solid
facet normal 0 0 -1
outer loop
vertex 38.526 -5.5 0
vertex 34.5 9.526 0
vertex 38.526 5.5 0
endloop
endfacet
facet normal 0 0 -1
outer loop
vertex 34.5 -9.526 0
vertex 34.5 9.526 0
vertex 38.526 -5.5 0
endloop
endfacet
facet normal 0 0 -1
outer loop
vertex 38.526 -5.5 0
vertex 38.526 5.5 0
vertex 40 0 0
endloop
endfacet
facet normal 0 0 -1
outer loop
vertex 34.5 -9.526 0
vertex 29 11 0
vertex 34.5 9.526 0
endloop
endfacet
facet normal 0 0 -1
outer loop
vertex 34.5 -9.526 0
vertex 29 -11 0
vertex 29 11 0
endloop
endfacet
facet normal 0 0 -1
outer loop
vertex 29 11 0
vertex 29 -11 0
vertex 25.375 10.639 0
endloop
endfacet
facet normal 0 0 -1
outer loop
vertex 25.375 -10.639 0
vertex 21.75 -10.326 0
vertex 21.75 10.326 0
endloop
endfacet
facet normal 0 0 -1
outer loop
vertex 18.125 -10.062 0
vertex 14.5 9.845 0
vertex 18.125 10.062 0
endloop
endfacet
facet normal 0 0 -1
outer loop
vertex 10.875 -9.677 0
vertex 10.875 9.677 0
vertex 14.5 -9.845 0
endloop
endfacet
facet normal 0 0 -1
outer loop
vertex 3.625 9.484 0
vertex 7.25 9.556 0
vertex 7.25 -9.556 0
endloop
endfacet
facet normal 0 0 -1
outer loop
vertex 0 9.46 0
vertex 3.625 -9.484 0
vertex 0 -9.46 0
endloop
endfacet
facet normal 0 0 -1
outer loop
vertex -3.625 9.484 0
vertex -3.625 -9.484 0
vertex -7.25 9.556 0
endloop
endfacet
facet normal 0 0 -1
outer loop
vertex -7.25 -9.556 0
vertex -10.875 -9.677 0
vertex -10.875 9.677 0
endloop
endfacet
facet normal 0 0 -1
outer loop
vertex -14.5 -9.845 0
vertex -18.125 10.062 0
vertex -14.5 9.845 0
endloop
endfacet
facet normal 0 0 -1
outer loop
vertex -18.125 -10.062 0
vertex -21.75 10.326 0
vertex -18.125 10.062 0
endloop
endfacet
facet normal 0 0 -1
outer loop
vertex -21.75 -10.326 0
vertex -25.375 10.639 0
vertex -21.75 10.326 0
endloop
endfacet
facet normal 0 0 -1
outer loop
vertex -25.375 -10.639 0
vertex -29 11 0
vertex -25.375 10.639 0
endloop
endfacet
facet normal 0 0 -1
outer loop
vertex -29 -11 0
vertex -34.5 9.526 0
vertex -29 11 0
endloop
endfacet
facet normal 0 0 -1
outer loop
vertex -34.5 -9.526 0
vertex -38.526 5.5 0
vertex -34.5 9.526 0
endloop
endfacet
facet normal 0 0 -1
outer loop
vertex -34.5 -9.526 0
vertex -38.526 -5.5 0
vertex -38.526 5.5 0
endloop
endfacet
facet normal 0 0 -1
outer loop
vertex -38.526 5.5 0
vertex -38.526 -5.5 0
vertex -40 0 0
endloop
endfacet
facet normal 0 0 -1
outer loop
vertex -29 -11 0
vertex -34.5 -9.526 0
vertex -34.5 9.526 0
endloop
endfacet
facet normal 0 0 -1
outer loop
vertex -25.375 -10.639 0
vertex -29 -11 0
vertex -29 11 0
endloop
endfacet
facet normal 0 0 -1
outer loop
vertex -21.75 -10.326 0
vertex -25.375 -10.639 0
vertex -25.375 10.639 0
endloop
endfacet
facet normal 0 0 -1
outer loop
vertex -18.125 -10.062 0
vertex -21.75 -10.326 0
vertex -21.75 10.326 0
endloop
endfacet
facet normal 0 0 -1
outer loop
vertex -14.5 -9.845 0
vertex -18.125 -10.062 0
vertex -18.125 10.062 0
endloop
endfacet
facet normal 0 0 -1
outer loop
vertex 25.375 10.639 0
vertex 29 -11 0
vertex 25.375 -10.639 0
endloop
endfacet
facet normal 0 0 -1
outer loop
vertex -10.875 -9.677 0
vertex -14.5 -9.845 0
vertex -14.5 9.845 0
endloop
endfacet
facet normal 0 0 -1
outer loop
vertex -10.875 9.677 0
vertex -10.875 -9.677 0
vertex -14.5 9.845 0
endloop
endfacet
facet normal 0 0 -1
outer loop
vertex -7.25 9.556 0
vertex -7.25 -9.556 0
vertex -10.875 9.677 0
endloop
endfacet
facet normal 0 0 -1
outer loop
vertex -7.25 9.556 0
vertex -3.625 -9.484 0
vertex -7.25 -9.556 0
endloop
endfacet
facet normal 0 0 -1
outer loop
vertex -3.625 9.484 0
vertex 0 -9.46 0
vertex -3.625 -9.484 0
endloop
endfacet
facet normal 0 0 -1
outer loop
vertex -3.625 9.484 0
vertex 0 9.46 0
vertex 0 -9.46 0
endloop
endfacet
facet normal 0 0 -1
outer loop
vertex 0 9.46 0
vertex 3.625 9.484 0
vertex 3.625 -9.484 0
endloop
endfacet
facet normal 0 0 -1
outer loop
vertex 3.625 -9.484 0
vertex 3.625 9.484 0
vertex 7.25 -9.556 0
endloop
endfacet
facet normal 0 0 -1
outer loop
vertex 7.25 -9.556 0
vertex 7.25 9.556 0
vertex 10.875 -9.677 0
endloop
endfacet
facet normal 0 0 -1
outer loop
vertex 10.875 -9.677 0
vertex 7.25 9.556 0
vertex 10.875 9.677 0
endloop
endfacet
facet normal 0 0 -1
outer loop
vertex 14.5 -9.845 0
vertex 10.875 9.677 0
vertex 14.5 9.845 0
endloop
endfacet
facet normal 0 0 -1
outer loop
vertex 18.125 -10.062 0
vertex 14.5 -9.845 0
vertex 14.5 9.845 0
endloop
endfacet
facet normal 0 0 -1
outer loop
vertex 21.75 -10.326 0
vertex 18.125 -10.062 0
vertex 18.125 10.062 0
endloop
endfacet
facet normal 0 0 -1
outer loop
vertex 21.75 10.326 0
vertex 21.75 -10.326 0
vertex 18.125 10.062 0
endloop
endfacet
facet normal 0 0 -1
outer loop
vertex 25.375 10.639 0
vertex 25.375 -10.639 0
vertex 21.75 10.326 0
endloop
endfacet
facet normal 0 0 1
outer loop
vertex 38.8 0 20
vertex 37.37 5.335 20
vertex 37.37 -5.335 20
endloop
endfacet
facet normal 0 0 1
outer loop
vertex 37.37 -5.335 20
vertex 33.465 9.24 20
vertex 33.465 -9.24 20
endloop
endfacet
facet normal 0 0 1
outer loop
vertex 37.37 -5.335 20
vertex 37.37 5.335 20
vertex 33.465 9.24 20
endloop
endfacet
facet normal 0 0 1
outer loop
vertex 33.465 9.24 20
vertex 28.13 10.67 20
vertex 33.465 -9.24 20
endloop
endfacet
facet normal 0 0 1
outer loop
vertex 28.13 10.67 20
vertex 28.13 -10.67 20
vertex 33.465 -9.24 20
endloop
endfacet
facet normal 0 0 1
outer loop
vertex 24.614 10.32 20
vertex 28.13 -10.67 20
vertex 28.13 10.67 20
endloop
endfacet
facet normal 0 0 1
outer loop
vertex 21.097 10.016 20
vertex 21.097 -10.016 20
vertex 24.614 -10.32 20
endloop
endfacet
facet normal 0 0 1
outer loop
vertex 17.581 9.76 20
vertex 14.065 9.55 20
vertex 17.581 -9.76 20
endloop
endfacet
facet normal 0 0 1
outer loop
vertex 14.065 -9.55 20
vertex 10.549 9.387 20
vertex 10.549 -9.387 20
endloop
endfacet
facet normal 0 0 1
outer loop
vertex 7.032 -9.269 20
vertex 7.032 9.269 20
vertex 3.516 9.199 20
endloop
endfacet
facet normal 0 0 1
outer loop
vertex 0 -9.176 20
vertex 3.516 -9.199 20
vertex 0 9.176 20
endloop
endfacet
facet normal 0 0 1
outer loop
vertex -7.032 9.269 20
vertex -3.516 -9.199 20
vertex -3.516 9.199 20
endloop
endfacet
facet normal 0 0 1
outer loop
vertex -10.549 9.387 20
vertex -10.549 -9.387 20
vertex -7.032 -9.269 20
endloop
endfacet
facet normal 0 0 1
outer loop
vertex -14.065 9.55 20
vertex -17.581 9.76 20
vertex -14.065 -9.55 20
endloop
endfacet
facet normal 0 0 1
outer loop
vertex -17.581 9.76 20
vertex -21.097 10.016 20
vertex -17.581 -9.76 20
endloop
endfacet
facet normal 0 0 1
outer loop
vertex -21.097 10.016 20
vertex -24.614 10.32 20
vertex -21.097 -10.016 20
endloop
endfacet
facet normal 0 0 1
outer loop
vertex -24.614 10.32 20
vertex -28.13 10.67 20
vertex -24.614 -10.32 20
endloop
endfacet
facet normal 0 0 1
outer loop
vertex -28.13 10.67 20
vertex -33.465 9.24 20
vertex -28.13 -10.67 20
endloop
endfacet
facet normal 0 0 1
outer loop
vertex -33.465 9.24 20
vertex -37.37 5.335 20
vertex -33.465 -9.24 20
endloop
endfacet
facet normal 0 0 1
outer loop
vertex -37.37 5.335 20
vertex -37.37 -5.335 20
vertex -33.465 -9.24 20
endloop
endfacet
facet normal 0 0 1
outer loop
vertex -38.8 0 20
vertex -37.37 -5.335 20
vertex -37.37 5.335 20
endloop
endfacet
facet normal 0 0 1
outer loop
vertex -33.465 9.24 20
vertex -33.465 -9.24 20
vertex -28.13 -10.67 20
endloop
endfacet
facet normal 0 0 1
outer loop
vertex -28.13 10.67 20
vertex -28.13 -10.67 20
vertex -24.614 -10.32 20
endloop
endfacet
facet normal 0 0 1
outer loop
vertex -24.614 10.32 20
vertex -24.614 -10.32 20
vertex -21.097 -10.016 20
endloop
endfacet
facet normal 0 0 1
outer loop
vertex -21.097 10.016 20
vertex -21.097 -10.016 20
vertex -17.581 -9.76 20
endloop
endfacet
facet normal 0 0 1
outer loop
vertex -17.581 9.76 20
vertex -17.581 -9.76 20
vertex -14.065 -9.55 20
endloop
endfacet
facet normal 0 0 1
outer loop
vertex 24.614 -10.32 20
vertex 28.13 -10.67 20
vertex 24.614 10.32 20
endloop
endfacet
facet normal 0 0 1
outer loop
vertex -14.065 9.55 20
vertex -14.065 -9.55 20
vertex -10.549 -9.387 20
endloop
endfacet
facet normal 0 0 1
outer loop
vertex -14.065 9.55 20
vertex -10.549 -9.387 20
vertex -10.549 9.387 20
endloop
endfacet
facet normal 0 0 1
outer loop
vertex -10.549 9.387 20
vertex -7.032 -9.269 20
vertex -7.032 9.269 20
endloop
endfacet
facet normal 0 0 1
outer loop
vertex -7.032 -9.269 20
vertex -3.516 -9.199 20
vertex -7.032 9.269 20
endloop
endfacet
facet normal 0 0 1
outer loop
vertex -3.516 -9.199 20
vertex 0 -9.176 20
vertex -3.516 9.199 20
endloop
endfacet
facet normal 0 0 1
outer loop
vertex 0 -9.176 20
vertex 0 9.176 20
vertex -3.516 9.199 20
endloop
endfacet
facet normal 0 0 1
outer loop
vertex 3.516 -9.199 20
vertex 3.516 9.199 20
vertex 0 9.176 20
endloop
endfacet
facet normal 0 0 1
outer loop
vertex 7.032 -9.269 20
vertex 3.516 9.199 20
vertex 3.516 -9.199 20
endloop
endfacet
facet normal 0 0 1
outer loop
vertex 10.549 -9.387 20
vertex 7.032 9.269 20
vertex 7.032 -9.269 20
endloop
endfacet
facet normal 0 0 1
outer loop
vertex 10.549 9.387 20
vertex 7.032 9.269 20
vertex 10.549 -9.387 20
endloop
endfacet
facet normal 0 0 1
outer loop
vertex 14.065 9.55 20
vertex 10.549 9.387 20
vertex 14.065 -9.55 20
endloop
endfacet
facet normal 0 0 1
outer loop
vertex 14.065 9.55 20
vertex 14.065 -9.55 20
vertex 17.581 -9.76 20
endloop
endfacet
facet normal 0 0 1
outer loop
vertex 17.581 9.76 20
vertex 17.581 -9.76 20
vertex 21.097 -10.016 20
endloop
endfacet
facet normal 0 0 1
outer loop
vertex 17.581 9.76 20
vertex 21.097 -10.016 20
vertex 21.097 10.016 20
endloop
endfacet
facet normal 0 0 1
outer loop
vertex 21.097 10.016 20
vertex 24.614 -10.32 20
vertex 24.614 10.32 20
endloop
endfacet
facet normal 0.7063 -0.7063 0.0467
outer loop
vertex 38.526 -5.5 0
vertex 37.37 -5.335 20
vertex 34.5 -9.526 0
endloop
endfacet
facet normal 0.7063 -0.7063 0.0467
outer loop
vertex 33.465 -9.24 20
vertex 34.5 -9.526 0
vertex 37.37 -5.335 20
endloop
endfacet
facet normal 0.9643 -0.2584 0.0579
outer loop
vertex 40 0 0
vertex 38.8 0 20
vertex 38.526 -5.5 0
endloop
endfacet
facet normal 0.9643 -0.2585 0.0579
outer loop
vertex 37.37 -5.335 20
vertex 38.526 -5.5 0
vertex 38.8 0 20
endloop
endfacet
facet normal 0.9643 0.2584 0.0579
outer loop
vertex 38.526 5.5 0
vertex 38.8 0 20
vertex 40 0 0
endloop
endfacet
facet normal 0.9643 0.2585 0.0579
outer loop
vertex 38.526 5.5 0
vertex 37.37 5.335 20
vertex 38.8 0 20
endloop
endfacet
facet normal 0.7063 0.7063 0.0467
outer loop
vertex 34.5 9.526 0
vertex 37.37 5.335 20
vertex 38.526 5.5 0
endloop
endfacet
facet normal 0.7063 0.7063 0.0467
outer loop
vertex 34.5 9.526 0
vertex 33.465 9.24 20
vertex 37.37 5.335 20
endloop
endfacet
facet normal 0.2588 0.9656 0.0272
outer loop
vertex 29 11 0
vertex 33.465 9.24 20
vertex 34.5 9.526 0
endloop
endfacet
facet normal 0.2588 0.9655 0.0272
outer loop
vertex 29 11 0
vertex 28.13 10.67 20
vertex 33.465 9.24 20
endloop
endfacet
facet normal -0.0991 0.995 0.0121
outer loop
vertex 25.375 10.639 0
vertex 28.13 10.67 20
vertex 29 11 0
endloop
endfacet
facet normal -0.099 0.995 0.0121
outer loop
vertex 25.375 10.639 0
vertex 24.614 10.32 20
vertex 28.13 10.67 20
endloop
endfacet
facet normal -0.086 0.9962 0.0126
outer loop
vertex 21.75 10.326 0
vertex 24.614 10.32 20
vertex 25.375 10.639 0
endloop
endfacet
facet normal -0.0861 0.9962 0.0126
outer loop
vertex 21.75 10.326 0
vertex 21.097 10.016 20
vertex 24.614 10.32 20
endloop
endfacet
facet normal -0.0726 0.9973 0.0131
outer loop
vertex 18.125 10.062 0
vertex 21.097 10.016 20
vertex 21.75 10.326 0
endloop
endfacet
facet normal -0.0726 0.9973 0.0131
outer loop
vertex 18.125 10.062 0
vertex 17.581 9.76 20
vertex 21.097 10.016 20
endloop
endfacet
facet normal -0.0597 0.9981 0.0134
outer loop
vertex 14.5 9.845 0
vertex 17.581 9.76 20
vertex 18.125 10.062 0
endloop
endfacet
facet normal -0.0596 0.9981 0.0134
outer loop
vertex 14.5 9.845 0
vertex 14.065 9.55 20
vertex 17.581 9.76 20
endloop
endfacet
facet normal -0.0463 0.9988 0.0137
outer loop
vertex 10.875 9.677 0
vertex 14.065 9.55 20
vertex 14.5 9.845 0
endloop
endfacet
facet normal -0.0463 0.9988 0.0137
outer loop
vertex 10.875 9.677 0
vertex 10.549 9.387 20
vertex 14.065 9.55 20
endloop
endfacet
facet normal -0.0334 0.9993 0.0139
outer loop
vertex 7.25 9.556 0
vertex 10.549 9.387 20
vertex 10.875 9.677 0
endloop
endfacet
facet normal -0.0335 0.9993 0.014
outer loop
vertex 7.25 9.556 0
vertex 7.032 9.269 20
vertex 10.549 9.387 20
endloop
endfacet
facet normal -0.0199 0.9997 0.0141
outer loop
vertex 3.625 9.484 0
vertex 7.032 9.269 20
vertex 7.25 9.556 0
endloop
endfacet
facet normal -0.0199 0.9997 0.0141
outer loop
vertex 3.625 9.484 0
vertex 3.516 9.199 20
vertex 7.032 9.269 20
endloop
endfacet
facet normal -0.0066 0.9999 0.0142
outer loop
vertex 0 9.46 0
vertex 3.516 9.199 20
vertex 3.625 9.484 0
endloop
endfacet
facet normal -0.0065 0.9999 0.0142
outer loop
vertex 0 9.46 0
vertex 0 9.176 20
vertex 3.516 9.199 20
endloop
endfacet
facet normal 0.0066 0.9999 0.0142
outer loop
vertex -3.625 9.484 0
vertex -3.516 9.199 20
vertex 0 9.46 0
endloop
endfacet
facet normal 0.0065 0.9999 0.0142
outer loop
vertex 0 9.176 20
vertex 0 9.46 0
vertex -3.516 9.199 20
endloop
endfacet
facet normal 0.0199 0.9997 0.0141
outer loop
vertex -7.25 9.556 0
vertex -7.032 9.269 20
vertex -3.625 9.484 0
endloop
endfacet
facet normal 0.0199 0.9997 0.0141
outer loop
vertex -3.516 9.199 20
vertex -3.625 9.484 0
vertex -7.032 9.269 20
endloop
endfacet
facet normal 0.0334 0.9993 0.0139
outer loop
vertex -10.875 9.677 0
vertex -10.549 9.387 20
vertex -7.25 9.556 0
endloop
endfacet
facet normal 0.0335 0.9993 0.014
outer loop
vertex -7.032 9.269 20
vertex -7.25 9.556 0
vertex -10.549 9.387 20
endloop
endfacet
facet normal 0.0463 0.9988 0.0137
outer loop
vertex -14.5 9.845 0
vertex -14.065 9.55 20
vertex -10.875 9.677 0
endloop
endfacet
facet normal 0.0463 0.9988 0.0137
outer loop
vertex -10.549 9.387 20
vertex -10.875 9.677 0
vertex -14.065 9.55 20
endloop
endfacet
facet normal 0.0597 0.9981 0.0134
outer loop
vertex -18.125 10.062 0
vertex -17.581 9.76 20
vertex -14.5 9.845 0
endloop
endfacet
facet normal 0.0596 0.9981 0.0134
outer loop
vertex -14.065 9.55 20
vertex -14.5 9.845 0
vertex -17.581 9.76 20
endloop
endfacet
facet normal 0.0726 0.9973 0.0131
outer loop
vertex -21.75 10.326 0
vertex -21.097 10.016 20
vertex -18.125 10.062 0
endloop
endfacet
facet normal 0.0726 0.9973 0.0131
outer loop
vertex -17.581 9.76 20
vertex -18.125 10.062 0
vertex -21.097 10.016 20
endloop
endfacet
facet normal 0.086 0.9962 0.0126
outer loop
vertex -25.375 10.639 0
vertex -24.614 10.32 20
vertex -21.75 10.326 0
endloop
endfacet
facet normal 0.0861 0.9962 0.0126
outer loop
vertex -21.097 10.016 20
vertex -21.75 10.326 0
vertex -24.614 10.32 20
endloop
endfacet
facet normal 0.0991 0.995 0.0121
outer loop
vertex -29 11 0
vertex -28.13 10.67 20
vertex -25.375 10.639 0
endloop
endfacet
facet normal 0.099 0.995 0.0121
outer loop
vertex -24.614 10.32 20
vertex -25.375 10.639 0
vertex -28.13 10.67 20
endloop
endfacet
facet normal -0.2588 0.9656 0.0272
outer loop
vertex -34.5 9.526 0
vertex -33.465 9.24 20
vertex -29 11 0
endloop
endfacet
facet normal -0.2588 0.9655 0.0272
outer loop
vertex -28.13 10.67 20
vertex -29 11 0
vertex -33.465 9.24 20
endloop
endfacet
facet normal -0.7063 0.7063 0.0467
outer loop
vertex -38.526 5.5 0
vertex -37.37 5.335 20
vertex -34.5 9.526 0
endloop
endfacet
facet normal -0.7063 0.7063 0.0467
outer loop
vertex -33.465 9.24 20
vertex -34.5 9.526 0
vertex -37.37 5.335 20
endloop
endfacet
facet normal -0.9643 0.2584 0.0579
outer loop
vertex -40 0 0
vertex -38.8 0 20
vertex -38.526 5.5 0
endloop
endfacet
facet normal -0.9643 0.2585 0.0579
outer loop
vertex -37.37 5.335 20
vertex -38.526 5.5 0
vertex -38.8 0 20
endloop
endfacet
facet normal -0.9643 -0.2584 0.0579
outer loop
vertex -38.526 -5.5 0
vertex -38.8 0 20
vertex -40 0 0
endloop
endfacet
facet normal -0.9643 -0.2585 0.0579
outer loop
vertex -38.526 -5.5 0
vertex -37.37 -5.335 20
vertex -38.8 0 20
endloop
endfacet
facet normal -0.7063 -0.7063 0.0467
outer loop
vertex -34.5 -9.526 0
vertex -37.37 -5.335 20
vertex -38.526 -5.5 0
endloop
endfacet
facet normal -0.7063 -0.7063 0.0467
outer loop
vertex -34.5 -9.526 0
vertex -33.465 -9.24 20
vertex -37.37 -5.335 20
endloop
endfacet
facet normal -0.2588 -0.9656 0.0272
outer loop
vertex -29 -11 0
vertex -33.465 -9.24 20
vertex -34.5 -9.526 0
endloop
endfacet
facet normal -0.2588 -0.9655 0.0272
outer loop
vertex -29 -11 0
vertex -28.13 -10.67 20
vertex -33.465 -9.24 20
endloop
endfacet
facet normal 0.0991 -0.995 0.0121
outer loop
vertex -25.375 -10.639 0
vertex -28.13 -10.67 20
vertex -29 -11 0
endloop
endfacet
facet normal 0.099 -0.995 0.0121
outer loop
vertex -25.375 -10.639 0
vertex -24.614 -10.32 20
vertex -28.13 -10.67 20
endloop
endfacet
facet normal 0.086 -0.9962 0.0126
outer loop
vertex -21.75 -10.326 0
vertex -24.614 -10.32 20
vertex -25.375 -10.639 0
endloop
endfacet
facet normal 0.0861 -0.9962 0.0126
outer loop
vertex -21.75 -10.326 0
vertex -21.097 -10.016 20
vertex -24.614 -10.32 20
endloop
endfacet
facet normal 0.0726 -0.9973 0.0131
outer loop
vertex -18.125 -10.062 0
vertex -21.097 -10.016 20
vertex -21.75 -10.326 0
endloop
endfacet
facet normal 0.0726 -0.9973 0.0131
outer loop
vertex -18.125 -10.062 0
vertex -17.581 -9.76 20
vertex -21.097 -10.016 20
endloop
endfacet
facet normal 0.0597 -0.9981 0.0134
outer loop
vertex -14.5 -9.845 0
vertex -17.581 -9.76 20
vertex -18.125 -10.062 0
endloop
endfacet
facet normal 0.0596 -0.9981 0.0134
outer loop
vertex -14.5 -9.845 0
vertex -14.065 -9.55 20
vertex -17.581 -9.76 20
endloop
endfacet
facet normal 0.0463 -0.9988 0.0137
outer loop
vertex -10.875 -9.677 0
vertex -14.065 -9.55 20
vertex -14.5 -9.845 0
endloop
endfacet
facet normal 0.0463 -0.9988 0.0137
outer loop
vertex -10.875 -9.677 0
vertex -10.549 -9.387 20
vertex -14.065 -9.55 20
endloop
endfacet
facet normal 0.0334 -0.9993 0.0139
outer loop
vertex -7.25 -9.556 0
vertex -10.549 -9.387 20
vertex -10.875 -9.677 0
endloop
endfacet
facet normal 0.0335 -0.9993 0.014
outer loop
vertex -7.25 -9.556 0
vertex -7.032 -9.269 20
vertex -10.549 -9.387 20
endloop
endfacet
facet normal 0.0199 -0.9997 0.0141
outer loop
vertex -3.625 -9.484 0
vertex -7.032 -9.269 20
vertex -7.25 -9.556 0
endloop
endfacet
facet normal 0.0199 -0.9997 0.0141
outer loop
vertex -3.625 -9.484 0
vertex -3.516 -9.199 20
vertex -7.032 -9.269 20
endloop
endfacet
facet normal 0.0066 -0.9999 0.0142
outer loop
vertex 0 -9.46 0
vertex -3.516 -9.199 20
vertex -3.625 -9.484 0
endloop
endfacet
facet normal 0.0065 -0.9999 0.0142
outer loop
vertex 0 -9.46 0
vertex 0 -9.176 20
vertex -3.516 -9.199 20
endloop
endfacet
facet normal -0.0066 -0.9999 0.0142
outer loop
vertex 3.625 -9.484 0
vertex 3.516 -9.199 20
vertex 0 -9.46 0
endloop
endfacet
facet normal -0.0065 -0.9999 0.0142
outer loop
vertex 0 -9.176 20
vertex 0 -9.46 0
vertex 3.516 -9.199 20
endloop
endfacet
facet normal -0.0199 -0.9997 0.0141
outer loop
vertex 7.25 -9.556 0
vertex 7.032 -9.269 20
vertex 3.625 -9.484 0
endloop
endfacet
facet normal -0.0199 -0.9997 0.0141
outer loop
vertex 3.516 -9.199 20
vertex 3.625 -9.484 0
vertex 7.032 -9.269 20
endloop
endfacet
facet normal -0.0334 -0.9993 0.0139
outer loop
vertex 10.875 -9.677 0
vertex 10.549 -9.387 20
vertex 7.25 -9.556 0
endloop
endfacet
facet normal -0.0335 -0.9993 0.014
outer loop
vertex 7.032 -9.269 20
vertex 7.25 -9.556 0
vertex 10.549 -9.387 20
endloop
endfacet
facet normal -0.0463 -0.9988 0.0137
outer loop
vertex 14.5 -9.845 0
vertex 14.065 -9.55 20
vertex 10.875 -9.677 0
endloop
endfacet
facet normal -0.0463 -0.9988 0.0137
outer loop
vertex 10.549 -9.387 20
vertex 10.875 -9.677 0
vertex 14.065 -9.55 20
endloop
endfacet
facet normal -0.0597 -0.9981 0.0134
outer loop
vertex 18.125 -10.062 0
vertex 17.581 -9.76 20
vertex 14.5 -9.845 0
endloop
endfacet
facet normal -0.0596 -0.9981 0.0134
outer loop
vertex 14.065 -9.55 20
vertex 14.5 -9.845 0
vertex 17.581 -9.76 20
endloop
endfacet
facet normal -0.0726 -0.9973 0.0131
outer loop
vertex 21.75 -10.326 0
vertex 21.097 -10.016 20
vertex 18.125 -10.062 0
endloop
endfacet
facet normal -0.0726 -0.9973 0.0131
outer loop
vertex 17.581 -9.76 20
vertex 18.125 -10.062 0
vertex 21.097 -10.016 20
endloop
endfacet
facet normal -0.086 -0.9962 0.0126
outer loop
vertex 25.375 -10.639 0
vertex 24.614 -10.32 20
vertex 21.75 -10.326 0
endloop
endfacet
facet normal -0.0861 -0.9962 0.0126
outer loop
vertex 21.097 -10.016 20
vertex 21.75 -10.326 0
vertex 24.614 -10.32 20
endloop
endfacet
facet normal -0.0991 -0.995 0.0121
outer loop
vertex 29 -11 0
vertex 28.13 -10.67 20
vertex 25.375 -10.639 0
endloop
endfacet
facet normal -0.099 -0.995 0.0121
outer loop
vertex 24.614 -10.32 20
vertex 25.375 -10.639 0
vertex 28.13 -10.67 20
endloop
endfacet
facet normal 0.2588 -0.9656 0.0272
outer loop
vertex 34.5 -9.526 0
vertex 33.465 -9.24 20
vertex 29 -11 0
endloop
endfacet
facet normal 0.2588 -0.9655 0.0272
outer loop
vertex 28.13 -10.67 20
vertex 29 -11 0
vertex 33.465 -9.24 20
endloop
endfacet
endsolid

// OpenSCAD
$fn = 32;

// ----------------------------------------------------------------------
// Handle: 80 x 22 mm grip, 20 mm thick
// ----------------------------------------------------------------------

// --- parameters (mm) ---
length = 80;              // grip length
width = 22;               // grip width
thickness = 20;           // grip thickness
waist = 0.86;             // width factor at the middle
draft = 0.97;             // top face scale of the extrusion

/* ergonomic grip outline, closed spline-like polygon in the XY plane */
grip = [[-29, 11], [-25.375, 10.639], [-21.75, 10.326], [-18.125, 10.062], [-14.5, 9.845], [-10.875, 9.677], [-7.25, 9.556], [-3.625, 9.484], [0, 9.46], [3.625, 9.484], [7.25, 9.556], [10.875, 9.677], [14.5, 9.845], [18.125, 10.062], [21.75, 10.326], [25.375, 10.639], [29, 11], [34.5, 9.526], [38.526, 5.5], [40, 0], [38.526, -5.5], [34.5, -9.526], [29, -11], [29, -11], [25.375, -10.639], [21.75, -10.326], [18.125, -10.062], [14.5, -9.845], [10.875, -9.677], [7.25, -9.556], [3.625, -9.484], [0, -9.46], [-3.625, -9.484], [-7.25, -9.556], [-10.875, -9.677], [-14.5, -9.845], [-18.125, -10.062], [-21.75, -10.326], [-25.375, -10.639], [-29, -11], [-34.5, -9.526], [-38.526, -5.5], [-40, 0], [-38.526, 5.5], [-34.5, 9.526], [-29, 11]];

module grip_body() {
  linear_extrude(height = thickness, scale = draft) polygon(grip);
}

difference() {
  union() {
    grip_body();
  }
}
